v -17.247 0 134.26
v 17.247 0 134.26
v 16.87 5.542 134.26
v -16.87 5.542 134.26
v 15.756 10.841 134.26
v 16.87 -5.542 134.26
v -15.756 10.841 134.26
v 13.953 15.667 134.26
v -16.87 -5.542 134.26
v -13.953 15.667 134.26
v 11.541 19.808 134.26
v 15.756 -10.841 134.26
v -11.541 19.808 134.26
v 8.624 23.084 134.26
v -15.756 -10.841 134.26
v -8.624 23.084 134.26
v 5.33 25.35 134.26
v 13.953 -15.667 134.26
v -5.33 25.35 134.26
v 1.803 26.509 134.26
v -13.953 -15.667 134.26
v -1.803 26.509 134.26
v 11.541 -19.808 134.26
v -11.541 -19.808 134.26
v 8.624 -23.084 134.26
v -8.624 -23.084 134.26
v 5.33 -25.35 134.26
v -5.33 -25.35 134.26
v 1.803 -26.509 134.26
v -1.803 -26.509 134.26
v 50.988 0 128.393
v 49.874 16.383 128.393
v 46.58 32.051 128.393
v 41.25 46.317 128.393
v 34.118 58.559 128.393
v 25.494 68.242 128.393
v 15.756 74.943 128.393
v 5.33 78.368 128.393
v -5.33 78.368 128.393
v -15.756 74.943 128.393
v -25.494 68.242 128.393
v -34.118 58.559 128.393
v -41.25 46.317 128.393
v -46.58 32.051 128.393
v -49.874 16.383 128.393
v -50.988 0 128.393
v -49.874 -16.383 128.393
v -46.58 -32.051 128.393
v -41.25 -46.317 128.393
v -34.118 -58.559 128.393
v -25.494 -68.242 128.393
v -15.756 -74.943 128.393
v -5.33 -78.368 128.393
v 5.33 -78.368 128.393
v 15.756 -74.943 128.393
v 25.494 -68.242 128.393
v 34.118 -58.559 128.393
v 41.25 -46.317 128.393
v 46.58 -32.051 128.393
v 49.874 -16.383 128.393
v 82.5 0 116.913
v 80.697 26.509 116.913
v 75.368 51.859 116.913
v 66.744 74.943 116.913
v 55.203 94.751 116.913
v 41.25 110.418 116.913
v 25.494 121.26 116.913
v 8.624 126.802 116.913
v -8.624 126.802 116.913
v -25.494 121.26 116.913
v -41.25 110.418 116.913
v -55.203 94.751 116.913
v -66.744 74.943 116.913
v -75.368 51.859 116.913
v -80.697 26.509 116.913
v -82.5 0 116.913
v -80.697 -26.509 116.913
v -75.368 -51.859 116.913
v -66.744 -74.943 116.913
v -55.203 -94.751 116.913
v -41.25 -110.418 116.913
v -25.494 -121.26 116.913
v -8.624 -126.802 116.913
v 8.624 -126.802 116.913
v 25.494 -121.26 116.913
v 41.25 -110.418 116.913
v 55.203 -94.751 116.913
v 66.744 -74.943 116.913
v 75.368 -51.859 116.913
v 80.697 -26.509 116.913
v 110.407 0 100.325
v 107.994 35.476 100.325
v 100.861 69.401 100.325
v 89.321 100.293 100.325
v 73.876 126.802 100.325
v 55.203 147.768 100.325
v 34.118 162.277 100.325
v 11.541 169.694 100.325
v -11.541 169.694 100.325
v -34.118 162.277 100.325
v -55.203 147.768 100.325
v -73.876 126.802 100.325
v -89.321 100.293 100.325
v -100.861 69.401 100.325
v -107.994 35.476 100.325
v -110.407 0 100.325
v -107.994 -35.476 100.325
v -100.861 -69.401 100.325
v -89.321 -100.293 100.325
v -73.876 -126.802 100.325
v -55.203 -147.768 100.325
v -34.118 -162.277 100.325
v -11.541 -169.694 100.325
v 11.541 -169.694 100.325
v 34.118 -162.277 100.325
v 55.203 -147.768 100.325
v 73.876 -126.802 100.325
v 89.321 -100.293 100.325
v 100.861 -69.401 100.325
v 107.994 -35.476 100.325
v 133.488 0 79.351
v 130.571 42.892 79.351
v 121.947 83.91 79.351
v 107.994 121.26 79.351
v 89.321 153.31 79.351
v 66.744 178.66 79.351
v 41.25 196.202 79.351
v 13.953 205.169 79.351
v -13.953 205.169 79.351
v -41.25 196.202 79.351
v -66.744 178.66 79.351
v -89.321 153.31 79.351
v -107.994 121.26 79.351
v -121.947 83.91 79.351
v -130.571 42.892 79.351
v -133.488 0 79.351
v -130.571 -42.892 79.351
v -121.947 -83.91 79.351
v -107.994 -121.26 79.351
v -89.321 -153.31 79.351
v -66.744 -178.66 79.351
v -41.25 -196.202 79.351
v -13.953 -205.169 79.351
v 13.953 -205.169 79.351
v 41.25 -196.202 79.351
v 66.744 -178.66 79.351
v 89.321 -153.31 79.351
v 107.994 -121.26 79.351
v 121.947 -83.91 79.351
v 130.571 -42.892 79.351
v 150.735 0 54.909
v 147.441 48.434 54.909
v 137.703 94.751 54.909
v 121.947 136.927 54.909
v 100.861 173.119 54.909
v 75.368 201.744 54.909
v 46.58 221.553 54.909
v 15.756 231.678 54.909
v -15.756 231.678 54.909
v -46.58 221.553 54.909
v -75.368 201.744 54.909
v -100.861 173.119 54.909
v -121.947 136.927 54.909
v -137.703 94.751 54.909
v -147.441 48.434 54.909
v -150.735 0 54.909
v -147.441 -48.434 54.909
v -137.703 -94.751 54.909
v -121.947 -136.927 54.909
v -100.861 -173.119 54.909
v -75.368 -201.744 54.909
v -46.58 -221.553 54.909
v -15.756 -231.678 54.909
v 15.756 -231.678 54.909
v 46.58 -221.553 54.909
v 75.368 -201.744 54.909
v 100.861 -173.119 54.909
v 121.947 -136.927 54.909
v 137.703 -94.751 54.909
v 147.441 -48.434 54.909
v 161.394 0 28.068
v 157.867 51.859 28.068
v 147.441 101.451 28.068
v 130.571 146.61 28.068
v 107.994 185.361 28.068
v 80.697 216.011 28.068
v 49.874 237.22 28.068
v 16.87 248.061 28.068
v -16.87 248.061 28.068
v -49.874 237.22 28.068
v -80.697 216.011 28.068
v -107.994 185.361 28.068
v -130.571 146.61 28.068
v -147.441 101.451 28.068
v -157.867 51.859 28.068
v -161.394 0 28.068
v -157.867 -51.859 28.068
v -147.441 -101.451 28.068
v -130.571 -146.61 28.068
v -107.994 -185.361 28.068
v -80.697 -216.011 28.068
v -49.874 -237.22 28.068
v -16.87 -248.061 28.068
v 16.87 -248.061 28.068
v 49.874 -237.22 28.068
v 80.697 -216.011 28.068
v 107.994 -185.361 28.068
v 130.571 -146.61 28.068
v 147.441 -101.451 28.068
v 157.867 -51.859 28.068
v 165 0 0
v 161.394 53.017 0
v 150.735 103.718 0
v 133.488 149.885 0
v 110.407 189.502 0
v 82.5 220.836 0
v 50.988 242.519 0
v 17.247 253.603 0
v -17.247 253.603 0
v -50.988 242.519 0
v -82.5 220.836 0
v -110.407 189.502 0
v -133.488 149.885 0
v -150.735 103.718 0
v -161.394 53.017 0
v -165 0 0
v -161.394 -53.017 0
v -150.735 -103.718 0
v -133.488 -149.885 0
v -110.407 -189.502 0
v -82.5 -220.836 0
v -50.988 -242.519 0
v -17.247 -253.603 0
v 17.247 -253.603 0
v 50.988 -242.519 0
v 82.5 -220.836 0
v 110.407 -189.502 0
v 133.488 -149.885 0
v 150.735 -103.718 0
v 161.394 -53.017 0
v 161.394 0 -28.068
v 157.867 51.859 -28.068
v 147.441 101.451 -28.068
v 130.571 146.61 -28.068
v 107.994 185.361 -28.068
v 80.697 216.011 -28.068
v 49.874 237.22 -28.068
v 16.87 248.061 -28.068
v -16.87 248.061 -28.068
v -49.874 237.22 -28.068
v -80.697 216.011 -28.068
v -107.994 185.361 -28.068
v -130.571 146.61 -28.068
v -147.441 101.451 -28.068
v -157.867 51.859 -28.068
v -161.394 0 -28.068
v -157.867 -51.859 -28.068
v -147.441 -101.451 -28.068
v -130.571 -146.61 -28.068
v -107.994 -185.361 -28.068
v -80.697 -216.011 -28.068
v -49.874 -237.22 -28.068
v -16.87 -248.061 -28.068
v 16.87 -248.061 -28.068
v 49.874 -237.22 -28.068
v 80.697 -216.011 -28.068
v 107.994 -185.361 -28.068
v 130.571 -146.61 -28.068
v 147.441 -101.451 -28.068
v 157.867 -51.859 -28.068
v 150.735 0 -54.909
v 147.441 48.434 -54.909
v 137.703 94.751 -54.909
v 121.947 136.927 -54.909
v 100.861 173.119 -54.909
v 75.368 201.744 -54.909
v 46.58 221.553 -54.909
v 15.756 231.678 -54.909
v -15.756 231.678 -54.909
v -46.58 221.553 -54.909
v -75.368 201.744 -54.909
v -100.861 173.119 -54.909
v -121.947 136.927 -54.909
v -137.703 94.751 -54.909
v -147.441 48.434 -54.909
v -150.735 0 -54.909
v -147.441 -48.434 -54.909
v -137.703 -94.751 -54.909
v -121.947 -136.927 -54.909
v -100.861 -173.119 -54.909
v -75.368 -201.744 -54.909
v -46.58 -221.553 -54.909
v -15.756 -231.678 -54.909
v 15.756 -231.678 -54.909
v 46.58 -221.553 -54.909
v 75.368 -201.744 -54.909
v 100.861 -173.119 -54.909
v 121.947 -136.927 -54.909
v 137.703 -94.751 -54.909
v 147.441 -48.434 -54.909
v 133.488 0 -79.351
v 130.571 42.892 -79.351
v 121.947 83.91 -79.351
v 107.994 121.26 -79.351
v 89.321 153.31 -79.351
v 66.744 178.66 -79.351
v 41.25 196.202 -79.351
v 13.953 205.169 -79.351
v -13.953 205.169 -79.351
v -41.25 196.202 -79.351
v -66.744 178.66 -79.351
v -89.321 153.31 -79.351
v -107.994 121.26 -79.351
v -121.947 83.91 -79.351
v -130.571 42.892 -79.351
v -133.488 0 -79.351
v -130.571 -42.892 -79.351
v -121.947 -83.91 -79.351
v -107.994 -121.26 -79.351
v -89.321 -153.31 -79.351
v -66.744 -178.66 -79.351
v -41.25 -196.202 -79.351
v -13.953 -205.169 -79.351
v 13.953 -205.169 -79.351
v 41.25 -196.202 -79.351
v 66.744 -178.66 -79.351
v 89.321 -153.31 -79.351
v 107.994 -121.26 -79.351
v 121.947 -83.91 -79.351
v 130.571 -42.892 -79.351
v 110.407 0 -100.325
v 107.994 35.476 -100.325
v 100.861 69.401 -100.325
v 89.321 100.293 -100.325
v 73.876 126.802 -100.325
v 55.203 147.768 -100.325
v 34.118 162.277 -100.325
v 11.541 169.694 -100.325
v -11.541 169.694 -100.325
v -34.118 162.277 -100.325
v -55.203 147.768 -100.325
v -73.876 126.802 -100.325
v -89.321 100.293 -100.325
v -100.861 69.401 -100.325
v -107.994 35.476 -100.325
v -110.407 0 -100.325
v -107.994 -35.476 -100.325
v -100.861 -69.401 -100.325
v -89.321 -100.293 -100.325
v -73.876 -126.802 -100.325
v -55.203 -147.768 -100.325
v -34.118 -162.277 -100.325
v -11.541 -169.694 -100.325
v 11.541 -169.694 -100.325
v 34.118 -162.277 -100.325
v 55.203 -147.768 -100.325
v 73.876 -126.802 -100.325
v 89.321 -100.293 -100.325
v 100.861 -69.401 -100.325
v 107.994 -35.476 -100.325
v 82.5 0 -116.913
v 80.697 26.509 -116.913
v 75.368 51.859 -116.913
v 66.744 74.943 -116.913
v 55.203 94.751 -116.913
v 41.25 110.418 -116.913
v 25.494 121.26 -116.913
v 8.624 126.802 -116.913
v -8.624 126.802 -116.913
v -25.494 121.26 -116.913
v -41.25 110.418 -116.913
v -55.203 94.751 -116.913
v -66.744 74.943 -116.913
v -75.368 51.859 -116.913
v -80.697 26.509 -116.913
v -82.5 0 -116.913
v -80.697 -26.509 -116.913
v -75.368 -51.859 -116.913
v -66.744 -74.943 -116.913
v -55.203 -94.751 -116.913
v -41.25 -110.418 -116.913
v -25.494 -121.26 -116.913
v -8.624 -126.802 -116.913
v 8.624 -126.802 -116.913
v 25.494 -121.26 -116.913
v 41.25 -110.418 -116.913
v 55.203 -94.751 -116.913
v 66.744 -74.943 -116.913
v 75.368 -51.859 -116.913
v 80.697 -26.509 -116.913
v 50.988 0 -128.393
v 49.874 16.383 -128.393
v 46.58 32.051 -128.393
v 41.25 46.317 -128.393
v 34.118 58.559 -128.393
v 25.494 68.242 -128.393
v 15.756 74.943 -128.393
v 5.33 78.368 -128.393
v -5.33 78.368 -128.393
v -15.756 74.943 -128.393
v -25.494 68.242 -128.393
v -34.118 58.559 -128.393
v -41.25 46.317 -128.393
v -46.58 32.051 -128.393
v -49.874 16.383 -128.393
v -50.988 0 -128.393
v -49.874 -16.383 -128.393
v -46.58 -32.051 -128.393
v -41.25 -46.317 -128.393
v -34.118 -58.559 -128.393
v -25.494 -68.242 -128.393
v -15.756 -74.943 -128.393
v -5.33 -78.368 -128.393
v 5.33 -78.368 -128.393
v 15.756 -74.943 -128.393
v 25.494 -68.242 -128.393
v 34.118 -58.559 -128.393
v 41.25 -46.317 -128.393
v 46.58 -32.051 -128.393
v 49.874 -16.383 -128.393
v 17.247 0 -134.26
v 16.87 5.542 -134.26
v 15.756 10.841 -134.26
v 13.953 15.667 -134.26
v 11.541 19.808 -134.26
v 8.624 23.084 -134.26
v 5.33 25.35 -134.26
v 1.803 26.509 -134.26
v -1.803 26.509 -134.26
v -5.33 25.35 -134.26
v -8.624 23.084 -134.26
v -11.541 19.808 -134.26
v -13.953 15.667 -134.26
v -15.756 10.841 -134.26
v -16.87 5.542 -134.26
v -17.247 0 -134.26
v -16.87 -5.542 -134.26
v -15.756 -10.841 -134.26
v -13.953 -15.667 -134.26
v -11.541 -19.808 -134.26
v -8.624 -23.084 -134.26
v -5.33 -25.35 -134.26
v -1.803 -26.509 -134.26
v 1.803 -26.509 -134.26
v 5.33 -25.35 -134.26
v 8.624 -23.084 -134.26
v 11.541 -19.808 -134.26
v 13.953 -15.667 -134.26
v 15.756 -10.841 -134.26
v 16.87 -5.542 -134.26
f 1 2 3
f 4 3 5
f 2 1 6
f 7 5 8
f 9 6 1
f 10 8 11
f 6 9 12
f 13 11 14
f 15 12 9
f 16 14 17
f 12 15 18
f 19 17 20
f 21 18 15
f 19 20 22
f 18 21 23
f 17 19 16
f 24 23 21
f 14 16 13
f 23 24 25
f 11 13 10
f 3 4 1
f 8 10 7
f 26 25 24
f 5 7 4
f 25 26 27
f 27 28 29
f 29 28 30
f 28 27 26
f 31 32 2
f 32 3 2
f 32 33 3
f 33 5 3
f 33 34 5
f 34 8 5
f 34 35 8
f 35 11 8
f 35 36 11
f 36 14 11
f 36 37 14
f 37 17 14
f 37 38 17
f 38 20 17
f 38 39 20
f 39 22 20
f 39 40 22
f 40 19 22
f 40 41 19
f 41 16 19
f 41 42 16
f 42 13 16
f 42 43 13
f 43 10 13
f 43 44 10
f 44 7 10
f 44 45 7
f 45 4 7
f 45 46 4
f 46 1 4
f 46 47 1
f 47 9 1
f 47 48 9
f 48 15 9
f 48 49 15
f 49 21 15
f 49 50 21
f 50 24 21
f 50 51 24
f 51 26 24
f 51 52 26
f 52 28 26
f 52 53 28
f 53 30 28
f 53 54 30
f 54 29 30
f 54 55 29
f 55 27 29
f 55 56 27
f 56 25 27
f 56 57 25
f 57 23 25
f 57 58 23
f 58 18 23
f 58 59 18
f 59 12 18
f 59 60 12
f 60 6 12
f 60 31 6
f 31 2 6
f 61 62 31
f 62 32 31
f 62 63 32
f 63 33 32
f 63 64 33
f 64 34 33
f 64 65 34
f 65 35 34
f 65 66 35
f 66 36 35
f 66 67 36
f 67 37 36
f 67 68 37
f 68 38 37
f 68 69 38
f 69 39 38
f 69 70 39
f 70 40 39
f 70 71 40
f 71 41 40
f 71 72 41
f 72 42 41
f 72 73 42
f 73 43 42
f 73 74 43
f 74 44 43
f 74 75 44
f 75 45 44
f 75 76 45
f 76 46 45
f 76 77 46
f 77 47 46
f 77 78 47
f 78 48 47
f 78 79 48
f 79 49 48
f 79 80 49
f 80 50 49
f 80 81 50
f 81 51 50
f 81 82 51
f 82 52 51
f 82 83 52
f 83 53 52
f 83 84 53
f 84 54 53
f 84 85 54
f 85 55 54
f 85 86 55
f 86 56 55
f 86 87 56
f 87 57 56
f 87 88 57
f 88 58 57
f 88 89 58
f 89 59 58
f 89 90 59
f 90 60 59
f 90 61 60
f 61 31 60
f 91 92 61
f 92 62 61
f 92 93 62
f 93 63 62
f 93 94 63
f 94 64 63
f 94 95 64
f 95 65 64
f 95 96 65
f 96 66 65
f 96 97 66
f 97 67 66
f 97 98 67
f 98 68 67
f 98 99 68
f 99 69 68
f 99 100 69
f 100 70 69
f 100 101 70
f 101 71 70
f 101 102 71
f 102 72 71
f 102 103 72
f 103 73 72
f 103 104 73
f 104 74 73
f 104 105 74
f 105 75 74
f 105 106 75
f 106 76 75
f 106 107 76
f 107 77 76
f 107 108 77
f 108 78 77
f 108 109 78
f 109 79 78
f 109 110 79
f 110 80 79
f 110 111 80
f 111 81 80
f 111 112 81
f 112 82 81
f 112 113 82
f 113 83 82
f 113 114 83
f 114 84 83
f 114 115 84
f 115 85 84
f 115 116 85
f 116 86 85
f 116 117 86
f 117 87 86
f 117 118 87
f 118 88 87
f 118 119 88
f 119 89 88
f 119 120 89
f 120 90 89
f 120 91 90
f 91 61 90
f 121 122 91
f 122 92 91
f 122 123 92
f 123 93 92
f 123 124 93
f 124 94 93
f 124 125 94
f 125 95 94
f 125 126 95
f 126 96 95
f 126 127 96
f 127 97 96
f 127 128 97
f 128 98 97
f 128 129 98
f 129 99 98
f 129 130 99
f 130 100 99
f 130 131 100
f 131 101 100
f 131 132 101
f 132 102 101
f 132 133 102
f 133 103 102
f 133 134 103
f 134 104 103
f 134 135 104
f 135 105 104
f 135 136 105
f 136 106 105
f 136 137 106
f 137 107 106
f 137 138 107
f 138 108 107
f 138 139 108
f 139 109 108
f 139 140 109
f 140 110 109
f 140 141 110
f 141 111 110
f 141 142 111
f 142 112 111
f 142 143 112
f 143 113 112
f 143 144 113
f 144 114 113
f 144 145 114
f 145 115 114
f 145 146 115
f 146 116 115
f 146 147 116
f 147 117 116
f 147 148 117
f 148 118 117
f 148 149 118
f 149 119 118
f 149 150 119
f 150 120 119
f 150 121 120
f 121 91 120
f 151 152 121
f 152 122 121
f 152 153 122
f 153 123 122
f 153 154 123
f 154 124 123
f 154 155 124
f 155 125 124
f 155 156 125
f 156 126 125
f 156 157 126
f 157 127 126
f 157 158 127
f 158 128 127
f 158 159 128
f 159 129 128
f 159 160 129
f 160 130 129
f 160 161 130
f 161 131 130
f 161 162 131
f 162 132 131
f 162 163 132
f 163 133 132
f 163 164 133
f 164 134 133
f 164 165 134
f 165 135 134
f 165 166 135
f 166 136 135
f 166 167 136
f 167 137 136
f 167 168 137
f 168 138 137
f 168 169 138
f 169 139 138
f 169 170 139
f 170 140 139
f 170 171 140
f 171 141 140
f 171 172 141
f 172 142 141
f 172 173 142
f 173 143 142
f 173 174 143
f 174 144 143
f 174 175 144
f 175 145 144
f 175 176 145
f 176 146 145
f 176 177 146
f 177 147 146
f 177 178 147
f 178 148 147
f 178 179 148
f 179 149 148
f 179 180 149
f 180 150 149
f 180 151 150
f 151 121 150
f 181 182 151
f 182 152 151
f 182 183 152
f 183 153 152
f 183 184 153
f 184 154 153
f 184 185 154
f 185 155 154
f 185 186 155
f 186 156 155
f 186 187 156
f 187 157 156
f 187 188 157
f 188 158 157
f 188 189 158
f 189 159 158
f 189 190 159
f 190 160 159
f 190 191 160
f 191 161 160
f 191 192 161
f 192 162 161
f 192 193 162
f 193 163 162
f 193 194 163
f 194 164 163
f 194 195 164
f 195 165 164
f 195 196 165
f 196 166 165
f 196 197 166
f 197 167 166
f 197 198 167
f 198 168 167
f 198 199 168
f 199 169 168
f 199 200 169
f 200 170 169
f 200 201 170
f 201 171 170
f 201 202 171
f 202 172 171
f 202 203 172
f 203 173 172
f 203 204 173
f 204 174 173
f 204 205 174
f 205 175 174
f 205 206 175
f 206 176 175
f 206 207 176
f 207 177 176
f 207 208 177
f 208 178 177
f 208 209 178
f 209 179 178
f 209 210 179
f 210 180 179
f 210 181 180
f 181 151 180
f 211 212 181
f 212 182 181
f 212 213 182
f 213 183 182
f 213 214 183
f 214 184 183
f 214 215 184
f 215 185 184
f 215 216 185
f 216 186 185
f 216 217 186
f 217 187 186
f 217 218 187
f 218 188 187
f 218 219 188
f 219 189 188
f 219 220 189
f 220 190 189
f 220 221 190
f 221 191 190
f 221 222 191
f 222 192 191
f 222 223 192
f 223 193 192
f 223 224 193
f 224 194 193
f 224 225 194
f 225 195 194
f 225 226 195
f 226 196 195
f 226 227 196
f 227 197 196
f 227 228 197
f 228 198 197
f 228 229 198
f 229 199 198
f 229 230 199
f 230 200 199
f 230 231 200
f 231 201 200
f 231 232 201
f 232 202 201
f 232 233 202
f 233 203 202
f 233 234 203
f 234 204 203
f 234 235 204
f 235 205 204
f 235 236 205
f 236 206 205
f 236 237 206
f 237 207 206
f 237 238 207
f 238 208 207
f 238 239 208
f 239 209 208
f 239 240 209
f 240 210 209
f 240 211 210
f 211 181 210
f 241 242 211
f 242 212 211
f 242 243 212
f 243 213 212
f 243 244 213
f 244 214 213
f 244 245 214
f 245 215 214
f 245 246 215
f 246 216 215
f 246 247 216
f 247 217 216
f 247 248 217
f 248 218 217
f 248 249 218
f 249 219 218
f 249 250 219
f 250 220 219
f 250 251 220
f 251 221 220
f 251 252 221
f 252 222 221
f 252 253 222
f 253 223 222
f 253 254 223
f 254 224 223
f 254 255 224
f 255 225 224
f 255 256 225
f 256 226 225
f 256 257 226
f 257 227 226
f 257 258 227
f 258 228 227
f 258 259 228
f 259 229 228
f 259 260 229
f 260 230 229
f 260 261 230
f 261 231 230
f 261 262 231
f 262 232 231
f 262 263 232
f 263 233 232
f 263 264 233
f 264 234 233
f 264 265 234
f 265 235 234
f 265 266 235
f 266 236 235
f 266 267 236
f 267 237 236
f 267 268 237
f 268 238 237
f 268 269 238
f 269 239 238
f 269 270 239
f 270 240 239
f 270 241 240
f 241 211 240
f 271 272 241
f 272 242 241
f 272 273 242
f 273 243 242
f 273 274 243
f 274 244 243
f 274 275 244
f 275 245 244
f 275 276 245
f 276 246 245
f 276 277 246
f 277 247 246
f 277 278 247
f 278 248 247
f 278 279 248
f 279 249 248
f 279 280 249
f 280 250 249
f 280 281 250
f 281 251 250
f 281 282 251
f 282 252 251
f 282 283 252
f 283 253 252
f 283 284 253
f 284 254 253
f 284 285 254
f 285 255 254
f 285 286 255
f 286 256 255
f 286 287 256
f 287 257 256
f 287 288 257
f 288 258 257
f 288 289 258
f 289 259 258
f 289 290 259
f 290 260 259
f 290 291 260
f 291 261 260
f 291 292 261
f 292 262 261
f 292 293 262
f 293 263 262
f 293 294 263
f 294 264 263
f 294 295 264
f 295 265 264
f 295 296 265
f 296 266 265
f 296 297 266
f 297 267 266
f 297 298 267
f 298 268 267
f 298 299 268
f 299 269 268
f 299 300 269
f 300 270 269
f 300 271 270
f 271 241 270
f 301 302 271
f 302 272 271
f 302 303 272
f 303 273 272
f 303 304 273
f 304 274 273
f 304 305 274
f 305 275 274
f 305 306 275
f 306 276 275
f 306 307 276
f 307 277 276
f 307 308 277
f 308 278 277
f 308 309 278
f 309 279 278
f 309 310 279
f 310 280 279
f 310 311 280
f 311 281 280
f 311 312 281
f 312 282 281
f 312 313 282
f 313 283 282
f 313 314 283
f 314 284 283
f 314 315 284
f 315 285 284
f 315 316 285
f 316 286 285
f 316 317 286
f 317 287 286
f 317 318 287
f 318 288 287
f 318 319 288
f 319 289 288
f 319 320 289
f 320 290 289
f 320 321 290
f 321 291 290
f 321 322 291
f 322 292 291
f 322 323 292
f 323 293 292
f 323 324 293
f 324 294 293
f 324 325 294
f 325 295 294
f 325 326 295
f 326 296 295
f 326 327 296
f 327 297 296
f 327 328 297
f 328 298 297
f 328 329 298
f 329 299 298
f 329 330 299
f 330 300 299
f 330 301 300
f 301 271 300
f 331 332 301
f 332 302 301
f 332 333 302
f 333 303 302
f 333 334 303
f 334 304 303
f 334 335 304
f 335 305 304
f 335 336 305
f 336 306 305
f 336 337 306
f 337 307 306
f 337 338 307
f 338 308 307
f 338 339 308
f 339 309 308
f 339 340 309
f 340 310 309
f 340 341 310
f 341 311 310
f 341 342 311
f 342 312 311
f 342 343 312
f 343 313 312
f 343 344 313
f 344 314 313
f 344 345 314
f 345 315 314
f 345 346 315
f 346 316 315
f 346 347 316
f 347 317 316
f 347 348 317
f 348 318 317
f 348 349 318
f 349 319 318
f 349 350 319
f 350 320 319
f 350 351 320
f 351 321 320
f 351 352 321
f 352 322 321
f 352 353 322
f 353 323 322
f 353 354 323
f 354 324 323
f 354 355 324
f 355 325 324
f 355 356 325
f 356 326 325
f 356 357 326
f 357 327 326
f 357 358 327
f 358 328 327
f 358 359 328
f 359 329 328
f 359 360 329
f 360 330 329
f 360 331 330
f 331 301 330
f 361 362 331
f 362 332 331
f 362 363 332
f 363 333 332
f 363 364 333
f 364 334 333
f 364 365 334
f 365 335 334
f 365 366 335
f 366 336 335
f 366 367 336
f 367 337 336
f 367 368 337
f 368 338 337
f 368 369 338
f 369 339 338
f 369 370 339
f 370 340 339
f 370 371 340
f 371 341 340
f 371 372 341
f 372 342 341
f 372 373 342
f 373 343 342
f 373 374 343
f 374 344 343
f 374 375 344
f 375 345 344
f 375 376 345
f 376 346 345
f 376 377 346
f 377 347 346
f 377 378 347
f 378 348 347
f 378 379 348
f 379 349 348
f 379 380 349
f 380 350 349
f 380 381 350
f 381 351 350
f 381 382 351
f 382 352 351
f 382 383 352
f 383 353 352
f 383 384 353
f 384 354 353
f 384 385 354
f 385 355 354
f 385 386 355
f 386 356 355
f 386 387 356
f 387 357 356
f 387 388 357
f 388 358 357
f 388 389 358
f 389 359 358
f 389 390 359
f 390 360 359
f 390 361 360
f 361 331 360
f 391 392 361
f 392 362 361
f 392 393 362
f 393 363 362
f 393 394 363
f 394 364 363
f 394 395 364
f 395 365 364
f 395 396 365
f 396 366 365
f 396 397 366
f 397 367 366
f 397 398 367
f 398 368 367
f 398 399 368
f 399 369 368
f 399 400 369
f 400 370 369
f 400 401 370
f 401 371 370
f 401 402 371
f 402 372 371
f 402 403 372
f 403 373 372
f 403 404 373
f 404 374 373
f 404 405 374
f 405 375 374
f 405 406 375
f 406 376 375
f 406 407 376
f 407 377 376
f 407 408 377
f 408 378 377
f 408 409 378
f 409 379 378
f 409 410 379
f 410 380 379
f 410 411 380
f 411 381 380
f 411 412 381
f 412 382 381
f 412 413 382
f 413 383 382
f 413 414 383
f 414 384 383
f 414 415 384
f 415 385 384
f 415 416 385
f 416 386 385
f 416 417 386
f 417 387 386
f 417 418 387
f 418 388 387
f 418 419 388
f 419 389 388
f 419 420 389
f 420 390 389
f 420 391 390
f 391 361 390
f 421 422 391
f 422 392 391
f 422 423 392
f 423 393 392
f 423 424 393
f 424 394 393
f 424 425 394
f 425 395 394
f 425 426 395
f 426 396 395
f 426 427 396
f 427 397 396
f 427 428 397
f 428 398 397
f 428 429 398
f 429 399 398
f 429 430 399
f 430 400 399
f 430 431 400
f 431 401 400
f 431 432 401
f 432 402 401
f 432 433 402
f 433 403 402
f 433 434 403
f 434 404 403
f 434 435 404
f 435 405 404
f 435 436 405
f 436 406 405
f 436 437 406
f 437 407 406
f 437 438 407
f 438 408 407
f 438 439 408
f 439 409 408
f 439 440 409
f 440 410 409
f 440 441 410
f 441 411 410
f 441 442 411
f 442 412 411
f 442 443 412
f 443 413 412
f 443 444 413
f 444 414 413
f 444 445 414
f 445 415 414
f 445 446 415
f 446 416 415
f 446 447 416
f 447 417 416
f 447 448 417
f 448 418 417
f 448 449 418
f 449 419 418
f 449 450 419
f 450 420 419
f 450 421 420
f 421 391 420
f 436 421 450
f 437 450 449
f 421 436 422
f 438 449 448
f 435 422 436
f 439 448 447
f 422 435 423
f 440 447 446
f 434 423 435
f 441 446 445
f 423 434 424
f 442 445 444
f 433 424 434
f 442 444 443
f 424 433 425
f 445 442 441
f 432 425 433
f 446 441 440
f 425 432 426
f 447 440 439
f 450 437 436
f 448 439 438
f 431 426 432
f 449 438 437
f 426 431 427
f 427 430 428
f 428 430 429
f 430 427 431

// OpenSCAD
// Generated by SolidPython 1.0.1 on 2020-07-29 00:46:50


scale(v = [11, 17, 9]) {
	sphere(r = 15);
}
/***********************************************
*********      SolidPython code:      **********
************************************************
 
# import packages: SolidPython
from solid import *
from solid.utils import *
from itertools import chain, combinations, permutations


class Resize:

    def __init__(self, scad_file):
        self.scad_file = scad_file
        #self.scad_file = import_scad(scad_file)
        # cone/cylinder param:
        self.r1 = 0
        self.r2 = 0
        self.h = 0
        # rectangular prism param:
        self.w = 0
        self.l = 0
        # ellipse param:
        self.r = 0

    # import OpenScad code (file name corresponds to shape)


    # classify shape + parameters
    def assign(self, param1, param2, param3):
        if self.scad_file == 'cone.scad':
            self.r1 = param1
            self.r2 = param2
            self.h = param3
        elif self.scad_file == 'cylinder.scad':
            self.r1 = param1
            self.r2 = param2
            self.h = param3
        elif self.scad_file == 'rectangularPrism.scad':
            self.h = param1
            self.l = param2
            self.w = param3
        else:
            self.r = param1
            self.h = param2

    # resize parameters
    def iterate(self):
        x = range(3, 20, 2)
        i = 1
        if self.scad_file == 'cone.scad':
            tempList = list(permutations(x, 2))
            for temp in tempList:
                param1 = temp[0]
                param2 = temp[1]
                filepath = 'produced_scad_files/' + 'cone' + str(param1) + '_' + str(param2) + '_' + '.scad'
                scad_render_to_file(cylinder(h=param1, r1=param2, r2=0), filepath)

        elif self.scad_file == 'cylinder.scad':
            tempList = list(permutations(x, 3))
            for temp in tempList:
                param1 = temp[0]
                param2 = temp[1]
                filepath = 'produced_scad_files/' + 'cylinder' + str(param1) + '_' + str(param2) + '_' + '.scad'
                scad_render_to_file(cylinder(h=param1, r1=param2, r2=param2), filepath)

        elif self.scad_file == 'rectangularPrism.scad':
            tempList = list(permutations(x, 3))
            for temp in tempList:
                param1 = temp[0]
                param2 = temp[1]
                param3 = temp[2]
                filepath = 'produced_scad_files/' + 'rectangularPrism' + str(param1) + '_' + str(param2) + '_' + str(
                    param3) + '.scad'
                scad_render_to_file(cube(size=(param1, param2, param3)), filepath)

        elif self.scad_file == 'ellipse.scad':
            tempList = list(permutations(x, 4))
            for temp in tempList:
                param1 = temp[0]
                param2 = temp[1]
                param3 = temp[2]
                param4 = temp[3]
                filepath = 'produced_scad_files/' + 'ellipse' + str(param1) + '_' + str(param2) + '_' + str(param3) + '_' + str(param4) + '.scad'
                scad_render_to_file(scale([param1, param2, param3])(sphere(r=param4)), filepath)

    def render_to_scadfile(self):
        scad_render_to_file(scad, 'example.scad') 
 
************************************************/
